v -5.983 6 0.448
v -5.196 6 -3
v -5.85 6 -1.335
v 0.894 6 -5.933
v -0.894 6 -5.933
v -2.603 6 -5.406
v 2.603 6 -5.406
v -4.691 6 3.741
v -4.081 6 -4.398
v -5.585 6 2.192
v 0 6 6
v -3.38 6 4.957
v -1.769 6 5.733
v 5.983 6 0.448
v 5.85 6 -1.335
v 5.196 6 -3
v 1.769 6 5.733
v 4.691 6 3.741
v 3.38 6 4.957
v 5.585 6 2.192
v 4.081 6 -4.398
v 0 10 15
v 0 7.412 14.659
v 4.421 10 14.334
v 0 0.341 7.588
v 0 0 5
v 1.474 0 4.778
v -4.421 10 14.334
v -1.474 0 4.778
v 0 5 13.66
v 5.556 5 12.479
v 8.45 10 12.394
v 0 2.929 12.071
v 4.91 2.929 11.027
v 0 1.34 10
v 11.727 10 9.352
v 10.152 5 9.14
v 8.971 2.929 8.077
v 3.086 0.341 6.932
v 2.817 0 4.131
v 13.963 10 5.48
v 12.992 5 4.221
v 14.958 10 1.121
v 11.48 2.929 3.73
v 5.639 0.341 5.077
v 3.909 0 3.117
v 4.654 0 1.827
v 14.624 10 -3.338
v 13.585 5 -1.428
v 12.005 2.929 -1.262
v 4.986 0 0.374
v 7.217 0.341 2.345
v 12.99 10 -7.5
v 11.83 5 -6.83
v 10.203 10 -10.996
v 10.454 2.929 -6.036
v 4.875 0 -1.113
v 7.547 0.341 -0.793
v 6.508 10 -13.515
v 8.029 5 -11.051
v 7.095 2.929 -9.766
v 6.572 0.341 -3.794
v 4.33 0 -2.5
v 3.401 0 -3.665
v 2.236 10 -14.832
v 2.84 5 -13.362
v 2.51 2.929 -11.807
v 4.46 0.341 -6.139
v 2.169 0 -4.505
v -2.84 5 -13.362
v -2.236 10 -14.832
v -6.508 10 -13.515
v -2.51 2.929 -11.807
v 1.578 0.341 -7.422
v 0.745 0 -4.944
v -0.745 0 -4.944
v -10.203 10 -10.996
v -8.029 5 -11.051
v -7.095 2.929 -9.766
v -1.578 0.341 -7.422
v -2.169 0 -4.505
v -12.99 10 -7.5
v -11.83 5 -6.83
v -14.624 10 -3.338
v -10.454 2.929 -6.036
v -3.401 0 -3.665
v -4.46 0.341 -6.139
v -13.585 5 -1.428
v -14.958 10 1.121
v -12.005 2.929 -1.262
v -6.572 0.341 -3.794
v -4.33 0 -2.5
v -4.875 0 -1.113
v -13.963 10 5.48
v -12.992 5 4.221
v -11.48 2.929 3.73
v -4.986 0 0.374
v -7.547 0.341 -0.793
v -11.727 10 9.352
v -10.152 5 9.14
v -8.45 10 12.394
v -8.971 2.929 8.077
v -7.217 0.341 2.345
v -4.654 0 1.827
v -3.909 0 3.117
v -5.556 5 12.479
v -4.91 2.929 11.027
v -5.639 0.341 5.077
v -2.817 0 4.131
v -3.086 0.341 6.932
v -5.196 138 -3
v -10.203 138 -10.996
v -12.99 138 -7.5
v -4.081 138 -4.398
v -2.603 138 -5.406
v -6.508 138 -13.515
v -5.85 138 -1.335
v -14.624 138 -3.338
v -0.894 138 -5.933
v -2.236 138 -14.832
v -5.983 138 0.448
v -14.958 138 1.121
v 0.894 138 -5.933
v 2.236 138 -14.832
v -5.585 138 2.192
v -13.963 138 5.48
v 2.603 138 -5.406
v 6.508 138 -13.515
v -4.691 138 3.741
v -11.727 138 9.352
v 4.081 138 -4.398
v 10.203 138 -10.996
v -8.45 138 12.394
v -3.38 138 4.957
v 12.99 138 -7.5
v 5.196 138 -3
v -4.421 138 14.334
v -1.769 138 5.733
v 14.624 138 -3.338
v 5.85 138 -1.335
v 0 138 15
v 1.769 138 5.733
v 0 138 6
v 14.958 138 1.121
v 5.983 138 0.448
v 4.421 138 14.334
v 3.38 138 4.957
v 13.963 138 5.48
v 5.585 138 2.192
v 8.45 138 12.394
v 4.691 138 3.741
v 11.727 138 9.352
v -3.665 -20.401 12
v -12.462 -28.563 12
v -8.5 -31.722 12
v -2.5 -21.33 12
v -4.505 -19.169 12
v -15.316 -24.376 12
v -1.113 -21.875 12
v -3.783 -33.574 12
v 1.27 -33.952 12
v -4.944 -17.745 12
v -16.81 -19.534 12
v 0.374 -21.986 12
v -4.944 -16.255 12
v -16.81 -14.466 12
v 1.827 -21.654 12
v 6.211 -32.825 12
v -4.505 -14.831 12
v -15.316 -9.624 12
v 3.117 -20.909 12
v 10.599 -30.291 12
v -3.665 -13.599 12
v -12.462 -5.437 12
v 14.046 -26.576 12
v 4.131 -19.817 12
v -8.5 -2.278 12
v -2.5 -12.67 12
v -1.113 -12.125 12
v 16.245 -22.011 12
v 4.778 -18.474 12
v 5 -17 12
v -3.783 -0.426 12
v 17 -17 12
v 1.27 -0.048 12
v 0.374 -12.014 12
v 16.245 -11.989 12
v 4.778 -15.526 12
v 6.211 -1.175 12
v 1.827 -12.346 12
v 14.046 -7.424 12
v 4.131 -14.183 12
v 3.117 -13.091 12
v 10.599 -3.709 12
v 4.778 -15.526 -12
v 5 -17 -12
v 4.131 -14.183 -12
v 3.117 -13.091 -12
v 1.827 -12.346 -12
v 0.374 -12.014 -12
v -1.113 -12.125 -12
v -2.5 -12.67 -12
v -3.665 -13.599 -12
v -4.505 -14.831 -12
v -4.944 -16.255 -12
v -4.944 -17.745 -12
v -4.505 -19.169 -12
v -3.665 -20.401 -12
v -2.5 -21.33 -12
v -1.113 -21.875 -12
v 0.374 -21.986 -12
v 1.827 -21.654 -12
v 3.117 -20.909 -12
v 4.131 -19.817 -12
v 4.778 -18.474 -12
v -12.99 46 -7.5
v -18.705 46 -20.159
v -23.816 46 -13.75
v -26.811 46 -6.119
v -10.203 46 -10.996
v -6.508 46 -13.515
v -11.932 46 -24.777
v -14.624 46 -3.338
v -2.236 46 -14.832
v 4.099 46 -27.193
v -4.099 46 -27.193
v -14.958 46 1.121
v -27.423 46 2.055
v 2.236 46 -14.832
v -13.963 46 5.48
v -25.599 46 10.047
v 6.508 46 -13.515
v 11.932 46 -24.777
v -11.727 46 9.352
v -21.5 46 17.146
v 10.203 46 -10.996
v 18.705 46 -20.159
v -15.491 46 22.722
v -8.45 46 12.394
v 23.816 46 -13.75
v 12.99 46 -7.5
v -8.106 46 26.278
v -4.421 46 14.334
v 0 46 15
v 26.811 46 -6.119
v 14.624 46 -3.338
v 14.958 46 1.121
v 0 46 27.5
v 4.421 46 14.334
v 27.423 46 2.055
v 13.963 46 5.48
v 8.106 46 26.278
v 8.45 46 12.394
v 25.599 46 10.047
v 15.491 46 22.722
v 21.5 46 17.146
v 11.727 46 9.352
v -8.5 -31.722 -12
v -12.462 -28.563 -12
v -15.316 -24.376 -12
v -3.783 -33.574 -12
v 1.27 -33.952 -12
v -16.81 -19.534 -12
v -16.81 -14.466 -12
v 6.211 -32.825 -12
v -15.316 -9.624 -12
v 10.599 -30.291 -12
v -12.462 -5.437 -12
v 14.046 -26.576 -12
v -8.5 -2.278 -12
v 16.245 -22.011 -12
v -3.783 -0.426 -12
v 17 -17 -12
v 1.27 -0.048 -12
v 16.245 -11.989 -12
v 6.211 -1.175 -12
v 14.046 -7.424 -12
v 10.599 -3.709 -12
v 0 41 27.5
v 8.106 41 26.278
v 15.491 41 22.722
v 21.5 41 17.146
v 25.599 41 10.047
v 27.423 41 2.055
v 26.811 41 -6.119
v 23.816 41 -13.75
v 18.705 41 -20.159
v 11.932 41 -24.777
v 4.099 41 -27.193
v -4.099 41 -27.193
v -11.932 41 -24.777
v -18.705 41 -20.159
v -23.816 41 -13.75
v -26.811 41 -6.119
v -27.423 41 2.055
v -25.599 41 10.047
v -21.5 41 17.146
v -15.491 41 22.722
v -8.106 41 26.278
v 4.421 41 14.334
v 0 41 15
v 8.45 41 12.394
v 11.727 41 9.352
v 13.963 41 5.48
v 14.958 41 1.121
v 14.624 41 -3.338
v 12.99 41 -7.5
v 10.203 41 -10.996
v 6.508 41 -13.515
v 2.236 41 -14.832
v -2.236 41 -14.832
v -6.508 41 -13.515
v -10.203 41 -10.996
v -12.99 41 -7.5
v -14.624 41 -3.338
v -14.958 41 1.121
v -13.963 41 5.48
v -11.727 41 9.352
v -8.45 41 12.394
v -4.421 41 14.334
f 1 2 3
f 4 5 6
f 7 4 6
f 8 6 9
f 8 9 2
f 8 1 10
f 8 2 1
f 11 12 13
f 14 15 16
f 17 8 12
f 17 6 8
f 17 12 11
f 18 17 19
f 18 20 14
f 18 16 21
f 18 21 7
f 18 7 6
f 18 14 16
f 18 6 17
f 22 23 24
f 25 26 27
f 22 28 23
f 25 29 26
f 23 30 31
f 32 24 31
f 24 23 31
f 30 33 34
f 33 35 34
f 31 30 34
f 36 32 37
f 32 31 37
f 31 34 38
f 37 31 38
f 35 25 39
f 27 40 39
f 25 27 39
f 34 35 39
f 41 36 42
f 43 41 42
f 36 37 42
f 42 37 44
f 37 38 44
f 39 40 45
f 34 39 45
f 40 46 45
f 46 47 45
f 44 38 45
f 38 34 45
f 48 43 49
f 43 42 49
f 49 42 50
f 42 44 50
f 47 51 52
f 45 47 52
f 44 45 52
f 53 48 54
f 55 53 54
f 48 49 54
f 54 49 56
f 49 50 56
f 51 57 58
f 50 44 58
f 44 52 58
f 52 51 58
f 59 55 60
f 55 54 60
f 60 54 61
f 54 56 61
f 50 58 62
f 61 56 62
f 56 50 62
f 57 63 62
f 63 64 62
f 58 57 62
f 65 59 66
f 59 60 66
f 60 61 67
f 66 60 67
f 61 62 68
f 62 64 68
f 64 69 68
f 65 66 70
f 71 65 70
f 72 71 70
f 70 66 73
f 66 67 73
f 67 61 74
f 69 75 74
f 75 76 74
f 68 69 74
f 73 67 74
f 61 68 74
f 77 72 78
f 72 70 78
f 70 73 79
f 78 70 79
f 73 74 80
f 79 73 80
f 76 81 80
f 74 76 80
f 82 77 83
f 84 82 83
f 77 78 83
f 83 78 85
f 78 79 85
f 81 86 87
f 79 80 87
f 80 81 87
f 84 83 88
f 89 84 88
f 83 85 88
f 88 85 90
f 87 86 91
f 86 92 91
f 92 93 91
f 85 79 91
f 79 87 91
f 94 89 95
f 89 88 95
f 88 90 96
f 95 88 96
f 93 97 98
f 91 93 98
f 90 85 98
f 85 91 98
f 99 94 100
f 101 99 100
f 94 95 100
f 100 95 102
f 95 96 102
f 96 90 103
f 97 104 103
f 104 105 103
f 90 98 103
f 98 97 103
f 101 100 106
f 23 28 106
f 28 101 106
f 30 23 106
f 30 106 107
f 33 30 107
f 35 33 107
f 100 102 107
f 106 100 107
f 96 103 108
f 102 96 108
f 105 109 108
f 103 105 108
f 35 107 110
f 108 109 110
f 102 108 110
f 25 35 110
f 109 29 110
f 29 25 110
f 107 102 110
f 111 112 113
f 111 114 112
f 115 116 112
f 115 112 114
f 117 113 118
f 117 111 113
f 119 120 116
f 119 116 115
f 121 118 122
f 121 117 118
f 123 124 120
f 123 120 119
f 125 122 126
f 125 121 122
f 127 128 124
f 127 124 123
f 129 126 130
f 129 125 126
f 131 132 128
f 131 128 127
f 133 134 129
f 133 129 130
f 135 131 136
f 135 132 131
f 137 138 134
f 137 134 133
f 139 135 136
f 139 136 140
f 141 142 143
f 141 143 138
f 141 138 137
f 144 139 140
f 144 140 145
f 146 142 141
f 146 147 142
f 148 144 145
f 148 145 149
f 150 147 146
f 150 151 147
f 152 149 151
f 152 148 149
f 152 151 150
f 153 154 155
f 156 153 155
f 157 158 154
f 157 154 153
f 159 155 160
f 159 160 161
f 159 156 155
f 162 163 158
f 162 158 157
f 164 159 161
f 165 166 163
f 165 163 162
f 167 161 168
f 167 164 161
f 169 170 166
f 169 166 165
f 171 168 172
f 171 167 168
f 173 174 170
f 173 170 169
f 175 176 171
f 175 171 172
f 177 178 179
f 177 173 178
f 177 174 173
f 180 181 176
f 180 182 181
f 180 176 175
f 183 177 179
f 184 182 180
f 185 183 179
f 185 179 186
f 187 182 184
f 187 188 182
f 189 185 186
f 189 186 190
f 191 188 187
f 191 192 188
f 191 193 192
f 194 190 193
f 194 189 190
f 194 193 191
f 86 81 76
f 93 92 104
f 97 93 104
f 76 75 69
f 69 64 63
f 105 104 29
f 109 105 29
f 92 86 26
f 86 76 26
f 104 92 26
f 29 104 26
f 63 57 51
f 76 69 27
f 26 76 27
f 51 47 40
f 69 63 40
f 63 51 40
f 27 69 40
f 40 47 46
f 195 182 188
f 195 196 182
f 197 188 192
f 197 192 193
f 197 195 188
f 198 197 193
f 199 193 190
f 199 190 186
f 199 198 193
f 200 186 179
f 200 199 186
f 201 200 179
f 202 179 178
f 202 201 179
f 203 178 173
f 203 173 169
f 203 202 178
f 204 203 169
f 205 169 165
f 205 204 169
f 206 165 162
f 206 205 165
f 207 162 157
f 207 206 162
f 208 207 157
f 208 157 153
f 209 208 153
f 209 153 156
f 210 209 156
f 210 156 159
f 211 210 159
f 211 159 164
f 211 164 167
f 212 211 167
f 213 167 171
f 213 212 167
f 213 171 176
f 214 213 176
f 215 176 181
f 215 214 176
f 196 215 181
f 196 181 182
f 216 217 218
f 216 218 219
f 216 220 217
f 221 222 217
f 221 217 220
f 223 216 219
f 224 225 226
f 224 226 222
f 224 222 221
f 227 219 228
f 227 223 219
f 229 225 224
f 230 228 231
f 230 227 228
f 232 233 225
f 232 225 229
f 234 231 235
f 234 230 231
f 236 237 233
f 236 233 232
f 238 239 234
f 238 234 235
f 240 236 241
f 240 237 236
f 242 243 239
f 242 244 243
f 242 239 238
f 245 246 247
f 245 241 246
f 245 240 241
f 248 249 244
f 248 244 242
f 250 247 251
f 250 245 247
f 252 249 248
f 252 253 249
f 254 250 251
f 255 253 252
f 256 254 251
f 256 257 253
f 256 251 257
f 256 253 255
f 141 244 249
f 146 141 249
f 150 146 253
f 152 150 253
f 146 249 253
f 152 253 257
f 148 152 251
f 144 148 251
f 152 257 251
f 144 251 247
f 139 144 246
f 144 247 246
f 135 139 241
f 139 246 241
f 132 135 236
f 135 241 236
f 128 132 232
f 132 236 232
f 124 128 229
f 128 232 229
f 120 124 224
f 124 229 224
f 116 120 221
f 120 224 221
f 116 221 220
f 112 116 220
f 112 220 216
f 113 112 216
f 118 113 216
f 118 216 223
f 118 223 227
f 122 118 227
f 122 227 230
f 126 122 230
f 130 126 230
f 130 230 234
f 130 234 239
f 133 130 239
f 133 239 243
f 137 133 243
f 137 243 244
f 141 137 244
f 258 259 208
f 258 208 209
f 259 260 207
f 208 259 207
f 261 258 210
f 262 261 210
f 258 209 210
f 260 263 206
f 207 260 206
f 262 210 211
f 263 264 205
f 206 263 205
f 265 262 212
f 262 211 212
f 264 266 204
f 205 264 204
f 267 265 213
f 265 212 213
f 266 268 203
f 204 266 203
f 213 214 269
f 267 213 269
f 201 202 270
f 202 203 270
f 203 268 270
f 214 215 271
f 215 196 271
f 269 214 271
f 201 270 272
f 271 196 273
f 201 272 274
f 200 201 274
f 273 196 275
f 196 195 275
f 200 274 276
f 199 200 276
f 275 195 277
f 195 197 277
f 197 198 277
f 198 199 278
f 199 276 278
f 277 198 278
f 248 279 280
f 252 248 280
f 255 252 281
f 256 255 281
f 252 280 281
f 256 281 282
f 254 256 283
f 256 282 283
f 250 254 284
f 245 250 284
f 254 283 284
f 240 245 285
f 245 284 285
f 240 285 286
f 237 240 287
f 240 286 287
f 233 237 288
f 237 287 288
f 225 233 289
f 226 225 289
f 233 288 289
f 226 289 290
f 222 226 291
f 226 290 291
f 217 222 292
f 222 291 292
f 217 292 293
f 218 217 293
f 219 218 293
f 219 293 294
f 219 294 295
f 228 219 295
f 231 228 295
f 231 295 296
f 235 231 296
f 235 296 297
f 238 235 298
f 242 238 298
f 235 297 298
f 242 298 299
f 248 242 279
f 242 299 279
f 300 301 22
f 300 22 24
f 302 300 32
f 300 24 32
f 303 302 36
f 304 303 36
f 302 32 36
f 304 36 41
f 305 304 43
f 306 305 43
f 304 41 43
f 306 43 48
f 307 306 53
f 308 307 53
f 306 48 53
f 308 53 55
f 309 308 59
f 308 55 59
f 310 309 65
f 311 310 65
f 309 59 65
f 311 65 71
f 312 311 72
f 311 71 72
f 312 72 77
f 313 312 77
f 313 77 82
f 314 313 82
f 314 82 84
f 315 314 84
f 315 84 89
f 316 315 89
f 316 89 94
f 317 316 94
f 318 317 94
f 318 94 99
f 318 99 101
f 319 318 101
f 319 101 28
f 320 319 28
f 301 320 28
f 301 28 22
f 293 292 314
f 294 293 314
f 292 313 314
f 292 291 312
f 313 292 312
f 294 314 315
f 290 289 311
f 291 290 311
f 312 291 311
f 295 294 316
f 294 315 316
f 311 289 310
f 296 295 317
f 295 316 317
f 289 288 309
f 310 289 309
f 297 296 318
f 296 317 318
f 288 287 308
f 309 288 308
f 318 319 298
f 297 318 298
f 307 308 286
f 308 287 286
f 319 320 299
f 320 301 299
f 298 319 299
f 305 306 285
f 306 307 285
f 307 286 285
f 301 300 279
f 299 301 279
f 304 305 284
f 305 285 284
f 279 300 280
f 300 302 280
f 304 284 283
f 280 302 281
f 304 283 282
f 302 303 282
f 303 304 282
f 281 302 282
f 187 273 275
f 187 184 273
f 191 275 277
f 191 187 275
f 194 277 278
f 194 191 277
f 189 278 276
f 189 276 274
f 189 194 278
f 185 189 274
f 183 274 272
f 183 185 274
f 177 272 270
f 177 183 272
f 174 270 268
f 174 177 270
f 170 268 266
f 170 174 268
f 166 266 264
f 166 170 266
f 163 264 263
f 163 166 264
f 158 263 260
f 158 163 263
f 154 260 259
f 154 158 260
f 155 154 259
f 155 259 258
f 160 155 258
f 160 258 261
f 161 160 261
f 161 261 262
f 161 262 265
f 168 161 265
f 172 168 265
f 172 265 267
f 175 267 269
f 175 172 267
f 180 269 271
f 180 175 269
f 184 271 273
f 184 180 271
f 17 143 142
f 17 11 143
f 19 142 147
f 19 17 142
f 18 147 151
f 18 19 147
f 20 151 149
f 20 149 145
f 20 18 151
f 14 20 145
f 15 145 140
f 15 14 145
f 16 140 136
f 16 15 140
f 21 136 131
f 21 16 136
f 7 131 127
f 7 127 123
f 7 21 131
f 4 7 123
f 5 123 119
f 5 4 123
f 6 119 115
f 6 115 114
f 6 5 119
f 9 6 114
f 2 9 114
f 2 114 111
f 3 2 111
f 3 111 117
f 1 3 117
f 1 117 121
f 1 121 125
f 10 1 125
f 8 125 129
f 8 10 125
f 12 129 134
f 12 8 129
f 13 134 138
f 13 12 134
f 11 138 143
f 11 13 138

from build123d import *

# Parameters (mm, degrees)
SKETCH_1_R          = 15
EXTRUDE_1_DEPTH     = 136
SKETCH_2_R          = 15
SKETCH_2_R_2        = 6
EXTRUDE_2_DEPTH     = 2
CUT_EXTRUDE_START   = -130
SKETCH_3_R          = 6
CUT_EXTRUDE_1_DEPTH = 130
SKETCH_4_R          = 17
SKETCH_4_R_2        = 5
EXTRUDE_3_DEPTH     = 12
FILLET_1_R          = 10
SKETCH_6_R          = 27.5
SKETCH_6_R_2        = 15
EXTRUDE_4_DEPTH     = 5


with BuildPart() as part:
    # Эскиз1 → Бобышка-Вытянуть1 (new body)
    with BuildSketch(Plane(origin=(0, 0, 0), x_dir=(1, 0, 0), z_dir=(0, 1, 0))):
        with Locations(Location((0, 0, 0), (0, 0, 270))):
            Circle(SKETCH_1_R)
    extrude(amount=EXTRUDE_1_DEPTH)

    # Эскиз2 → Бобышка-Вытянуть2 (add)
    with BuildSketch(Plane(origin=(0, 136, 0), x_dir=(1, 0, 0), z_dir=(0, 1, 0))):
        with Locations(Location((0, 0, 0), (0, 0, 270))):
            Circle(SKETCH_2_R)
        with Locations(Location((0, 0, 0), (0, 0, 270))):
            Circle(SKETCH_2_R_2, mode=Mode.SUBTRACT)
    extrude(amount=EXTRUDE_2_DEPTH)

    # Эскиз3 → Вырез-Вытянуть1 (cut)
    with BuildSketch(Plane(origin=(0, 136, 0), x_dir=(1, 0, 0), z_dir=(0, 1, 0)).offset(CUT_EXTRUDE_START)):
        with Locations(Location((0, 0, 0), (0, 0, 270))):
            Circle(SKETCH_3_R)
    extrude(amount=CUT_EXTRUDE_1_DEPTH, mode=Mode.SUBTRACT)

    # Скругление1
    fillet_1_edges = [part.edges().sort_by_distance(p)[0] for p in [
        (0, 0, -15),
    ]]
    fillet(fillet_1_edges, radius=FILLET_1_R)

    # Эскиз6 → Бобышка-Вытянуть4 (add)
    with BuildSketch(Plane(origin=(0, 41, 0), x_dir=(1, 0, 0), z_dir=(0, 1, 0))):
        with Locations(Location((0, 0, 0), (0, 0, 270))):
            Circle(SKETCH_6_R)
        with Locations(Location((0, 0, 0), (0, 0, 270))):
            Circle(SKETCH_6_R_2, mode=Mode.SUBTRACT)
    extrude(amount=EXTRUDE_4_DEPTH)


with BuildPart() as body_2:
    # Эскиз4 → Бобышка-Вытянуть3 (new, symmetric)
    with BuildSketch(Plane.XY):
        with Locations((0, -17)):
            Circle(SKETCH_4_R)
        with Locations((0, -17)):
            Circle(SKETCH_4_R_2, mode=Mode.SUBTRACT)
    extrude(amount=EXTRUDE_3_DEPTH, both=True)


solid = Compound([part.part, body_2.part])
